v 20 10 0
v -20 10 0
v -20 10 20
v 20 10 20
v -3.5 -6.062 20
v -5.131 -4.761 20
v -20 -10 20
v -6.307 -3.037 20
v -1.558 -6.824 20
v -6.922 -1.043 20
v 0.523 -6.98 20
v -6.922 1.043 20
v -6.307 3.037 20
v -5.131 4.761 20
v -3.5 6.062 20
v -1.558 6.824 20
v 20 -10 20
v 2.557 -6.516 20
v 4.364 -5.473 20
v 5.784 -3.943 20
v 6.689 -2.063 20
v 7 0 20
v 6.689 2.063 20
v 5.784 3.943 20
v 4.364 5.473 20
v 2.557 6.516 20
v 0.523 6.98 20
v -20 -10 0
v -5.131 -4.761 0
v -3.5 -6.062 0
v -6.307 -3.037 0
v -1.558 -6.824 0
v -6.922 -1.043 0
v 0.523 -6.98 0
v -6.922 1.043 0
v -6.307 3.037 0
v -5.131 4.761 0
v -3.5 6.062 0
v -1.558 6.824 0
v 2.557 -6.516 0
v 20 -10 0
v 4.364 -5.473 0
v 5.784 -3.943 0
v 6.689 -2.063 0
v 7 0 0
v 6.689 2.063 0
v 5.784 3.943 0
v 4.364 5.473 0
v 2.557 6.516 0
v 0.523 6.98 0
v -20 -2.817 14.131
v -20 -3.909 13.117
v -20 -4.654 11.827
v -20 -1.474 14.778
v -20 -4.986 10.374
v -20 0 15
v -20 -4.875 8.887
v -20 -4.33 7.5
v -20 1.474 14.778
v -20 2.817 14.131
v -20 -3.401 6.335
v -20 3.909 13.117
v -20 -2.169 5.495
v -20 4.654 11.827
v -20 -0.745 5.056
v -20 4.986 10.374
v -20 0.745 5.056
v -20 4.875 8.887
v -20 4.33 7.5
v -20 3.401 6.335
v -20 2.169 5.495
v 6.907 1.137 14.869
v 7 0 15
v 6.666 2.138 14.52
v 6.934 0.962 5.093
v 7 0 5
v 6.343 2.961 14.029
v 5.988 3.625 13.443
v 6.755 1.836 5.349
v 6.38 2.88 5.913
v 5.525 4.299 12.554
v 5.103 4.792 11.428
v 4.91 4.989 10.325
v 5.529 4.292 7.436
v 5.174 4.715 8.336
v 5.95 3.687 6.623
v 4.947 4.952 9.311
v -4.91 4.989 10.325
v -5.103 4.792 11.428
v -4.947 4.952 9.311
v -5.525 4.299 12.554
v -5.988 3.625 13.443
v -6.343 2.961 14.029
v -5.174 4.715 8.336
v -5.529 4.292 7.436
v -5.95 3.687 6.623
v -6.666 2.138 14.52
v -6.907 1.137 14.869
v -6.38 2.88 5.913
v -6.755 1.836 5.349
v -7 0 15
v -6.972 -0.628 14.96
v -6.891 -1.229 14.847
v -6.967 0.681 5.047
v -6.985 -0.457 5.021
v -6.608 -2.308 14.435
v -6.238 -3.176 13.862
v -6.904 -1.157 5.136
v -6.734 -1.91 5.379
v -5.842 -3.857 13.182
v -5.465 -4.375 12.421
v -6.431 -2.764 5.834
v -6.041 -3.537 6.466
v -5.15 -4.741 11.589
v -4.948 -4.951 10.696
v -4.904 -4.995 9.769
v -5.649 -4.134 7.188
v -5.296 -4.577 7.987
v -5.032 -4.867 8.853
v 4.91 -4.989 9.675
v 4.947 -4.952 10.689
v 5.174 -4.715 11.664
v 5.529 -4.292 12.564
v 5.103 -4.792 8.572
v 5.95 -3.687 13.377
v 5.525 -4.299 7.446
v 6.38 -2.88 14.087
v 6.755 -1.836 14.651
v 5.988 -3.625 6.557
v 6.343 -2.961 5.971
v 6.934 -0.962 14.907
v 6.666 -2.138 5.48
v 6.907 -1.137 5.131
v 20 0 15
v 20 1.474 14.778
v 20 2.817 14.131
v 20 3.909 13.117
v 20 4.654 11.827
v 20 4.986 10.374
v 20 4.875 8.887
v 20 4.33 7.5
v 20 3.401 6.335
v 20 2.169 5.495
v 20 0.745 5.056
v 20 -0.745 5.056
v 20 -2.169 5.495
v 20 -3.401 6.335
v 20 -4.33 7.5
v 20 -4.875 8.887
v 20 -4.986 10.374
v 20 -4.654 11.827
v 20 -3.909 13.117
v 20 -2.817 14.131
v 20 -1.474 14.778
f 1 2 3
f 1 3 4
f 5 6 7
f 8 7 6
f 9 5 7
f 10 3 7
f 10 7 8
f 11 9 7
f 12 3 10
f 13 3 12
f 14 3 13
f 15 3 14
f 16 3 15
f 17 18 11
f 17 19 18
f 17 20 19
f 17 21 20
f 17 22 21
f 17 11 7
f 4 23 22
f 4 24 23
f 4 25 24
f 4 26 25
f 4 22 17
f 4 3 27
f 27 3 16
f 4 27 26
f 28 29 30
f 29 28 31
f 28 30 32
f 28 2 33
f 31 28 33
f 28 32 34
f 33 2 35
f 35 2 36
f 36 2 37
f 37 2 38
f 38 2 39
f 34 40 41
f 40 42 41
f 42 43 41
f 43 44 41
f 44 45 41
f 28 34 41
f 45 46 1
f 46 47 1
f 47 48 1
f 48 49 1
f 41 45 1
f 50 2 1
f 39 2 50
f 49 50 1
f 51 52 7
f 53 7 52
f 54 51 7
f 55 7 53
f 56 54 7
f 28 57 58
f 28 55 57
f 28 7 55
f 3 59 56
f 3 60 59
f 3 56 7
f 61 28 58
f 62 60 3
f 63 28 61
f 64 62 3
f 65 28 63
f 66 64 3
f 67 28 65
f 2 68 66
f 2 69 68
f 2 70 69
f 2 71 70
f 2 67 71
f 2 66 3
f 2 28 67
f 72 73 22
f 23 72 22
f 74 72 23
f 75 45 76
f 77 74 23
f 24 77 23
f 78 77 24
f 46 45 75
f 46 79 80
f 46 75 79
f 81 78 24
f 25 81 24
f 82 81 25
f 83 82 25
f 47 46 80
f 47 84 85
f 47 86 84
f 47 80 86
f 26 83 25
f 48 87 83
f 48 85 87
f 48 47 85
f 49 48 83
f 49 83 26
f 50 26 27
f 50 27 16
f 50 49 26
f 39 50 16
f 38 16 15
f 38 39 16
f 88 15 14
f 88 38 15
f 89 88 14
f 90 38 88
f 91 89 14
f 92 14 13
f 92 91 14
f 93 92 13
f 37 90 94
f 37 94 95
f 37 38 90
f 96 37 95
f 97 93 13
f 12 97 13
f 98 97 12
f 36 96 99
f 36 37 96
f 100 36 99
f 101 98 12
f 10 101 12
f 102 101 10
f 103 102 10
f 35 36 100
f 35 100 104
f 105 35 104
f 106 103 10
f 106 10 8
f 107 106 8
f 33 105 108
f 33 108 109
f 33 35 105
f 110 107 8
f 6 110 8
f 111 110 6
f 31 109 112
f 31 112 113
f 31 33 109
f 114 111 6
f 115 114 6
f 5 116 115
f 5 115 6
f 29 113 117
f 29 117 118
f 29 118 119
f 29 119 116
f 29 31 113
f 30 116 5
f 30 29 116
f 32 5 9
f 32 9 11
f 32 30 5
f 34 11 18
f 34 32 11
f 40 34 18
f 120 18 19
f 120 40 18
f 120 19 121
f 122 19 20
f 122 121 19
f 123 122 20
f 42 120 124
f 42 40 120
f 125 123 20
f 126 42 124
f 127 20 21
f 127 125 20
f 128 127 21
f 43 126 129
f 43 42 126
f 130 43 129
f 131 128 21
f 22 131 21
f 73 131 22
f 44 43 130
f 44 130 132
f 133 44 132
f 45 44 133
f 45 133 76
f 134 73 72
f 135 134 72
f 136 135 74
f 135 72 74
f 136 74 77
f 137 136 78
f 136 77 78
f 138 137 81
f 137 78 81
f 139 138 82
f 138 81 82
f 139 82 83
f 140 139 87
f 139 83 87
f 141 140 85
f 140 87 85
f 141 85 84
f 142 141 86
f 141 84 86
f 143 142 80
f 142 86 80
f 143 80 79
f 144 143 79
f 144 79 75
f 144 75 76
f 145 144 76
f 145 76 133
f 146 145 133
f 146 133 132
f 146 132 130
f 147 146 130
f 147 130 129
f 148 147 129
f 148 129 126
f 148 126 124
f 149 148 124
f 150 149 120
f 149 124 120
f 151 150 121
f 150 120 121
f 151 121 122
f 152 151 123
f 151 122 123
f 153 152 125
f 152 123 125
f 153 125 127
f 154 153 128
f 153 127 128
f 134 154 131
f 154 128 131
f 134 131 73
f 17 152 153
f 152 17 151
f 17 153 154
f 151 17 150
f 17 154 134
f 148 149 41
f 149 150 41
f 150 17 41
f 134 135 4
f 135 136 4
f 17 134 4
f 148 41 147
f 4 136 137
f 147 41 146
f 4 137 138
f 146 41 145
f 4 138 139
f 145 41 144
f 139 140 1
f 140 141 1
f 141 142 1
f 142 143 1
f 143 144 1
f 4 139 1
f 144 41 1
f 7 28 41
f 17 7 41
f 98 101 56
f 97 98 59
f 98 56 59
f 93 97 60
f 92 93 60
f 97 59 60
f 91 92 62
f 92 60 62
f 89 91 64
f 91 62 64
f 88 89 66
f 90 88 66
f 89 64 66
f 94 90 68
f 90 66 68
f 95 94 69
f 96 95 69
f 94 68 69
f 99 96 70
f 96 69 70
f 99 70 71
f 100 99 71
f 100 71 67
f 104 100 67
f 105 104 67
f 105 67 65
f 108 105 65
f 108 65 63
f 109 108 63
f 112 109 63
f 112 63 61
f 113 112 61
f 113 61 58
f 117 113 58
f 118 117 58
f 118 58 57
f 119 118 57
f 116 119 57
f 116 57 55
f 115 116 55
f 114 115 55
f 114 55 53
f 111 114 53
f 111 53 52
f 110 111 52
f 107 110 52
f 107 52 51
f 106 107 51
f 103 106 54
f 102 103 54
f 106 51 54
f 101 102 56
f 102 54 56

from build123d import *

# Parameters (mm, degrees)
SKETCH_1_W          = 40
SKETCH_1_H          = 20
SKETCH_1_R          = 7
EXTRUDE_1_DEPTH     = 20
SKETCH_2_R          = 5
CUT_EXTRUDE_1_DEPTH = 41


with BuildPart() as part:
    # 草图1 → 凸台-拉伸1 (new body)
    with BuildSketch(Plane.XY):
        Rectangle(SKETCH_1_W, SKETCH_1_H)
        Circle(SKETCH_1_R, mode=Mode.SUBTRACT)
    extrude(amount=EXTRUDE_1_DEPTH)

    # 草图2 → 切除-拉伸1 (cut, through all)
    with BuildSketch(Plane.ZY.offset(20)):
        with Locations((10, 0)):
            Circle(SKETCH_2_R)
    extrude(amount=-CUT_EXTRUDE_1_DEPTH, mode=Mode.SUBTRACT)


solid = part.part
